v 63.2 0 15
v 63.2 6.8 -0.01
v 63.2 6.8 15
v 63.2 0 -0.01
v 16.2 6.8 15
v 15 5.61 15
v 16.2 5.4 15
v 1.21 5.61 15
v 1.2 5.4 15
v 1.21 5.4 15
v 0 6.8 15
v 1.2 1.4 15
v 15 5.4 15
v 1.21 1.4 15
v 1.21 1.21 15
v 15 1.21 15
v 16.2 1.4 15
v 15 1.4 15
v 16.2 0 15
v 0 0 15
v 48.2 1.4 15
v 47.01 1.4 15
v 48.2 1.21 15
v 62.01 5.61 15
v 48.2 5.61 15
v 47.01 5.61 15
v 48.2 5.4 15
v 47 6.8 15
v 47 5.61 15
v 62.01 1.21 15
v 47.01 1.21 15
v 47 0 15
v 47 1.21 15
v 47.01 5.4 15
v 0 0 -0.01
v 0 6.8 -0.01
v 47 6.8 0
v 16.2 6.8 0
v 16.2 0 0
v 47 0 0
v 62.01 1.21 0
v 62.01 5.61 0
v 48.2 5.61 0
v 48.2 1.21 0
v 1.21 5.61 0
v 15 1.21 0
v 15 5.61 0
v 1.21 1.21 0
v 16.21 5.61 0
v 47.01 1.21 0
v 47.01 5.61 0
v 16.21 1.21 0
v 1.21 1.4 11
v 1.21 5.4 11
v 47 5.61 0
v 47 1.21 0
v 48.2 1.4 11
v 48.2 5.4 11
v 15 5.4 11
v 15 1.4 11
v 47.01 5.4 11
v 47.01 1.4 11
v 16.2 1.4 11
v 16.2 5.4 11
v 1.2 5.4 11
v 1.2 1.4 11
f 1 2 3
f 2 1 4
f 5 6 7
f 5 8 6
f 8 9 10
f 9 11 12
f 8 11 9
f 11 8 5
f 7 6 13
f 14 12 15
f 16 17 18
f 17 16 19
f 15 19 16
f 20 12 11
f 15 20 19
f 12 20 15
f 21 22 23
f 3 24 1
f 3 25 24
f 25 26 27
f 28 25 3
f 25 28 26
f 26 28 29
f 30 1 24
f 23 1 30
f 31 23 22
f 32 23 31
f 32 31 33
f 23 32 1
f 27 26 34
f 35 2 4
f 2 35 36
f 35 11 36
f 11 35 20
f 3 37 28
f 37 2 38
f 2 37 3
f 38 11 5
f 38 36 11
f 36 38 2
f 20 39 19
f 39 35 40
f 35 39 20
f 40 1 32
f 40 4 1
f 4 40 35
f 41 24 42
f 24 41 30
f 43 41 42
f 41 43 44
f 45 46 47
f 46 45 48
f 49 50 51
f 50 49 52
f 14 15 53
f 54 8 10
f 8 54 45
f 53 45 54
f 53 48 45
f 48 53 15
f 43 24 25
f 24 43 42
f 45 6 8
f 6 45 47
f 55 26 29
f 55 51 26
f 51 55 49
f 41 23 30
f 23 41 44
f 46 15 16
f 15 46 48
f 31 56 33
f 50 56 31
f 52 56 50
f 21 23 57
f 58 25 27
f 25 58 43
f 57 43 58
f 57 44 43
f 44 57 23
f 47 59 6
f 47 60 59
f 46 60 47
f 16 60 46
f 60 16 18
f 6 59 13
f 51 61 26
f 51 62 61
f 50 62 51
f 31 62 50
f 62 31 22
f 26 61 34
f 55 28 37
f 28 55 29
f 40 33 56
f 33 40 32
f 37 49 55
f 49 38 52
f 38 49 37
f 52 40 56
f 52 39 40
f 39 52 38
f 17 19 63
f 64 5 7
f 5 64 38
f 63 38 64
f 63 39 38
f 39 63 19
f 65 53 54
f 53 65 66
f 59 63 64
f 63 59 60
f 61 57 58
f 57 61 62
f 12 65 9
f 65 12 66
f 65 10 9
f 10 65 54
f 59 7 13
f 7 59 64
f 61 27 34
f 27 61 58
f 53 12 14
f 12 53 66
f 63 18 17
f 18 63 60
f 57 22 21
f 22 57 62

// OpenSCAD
// file: ../Base/PlacementOptions.scad
// Fischertechnik Box Foundation
// Placement Options

// Alignment
NoAlign = 0;
AlignLeft = 1;
AlignBottom = 2;
AlignCenter = 3;
AlignRight = 4;
AlignTop = 5;

// Element rotation degree steps
rotations = [0, -90, -180, -270];

// Rotation
NoRotation = 0;
Rotate0 = 0;
Rotate90 = 1;
Rotate180 = 2;
Rotate270 = 3;

// Docking (seen from above)
NoDock = -1;
DockLeft = 0;
DockTop = 1;
DockRight = 2;
DockCorner = 2;
DockBottom = 3;

// Web corners
LowerLeft = 0;
UpperLeft = 1;
UpperRight = 2;
LowerRight = 3;

// Web position relative to corner
LeftOfCorner = 0;
RightOfCorner = 1;
// file: ../Base/Boxes.scad
// Fischertechnik Box Foundation
// Pre-designed Boxes

use <Constants.scad>

include <PlacementOptions.scad>

box190Width = 190;
box190Depth = 130;
box130Width = 130;
box130Depth = 95;

// Values are from an original ec3 box
topBottomDifference = 1.5;
outerHeight = 40;
baseThickness = 1.8;
innerHeight = outerHeight - baseThickness;
stackExcess = 5.7;
radius = 3.5;
wallThickness = 1.5;
tolerance = 0.2;

boxWallThickness = wallThickness;
boxBaseThickness = baseThickness;
boxWebWidth = 3.0;

// getBoxWallThickness()
// Gets the wall thickness of a Fischertechnik Box
function getBoxWallThickness() = boxWallThickness;

// getBoxUsageHeight(height = 38.2)
// Gets the usable height of a Fischertechnik box
// height = Outer height of the box from the bottom to the upper edge.
function getBoxUsageHeight(height = outerHeight) = height - baseThickness - stackExcess;

// getBoxInnerHeight()
// Gets the inner height of a Fischertechnik box, including the stack excess
function getBoxInnerHeight() = innerHeight;

// getBoxBaseThickness()
// Gets the thickness of the Fischertechnik box base.
function getBoxBaseThickness() = boxBaseThickness;

// getBoxWebWidth()
// Gets the width of a box web
function getBoxWebWidth() = boxWebWidth;

// getBox190Space()
// Gets the usable inner space of a Box 190 as an x/y-list
function getBox190Space() = [
    box190Width - 2*getBoxWallThickness() - topBottomDifference, 
    box190Depth - 2*getBoxWallThickness() - topBottomDifference ];

// RoundedCornerPlate(width, depth, height, radius)
// Creates a body plate with rounded corners for a box. Used
// also to create the complete box with the hull module.
// width = Width of the plate
// depth = depth of the plate 
// height = thickness of the plate
// radius = radius of the rounded corner
module RoundedCornerPlate(width, depth, height, radius) {
    translate([radius, radius])
    hull() {
        w = width-2*radius;
        d = depth-2*radius;
        cube([w, d, height]);
        cylinder(height, r=radius, $fn=getFragments());
        translate([w, 0])
            cylinder(height, r=radius, $fn=getFragments());
        translate([w, d])
            cylinder(height, r=radius, $fn=getFragments());
        translate([0, d])
            cylinder(height, r=radius, $fn=getFragments());
    }
}

// BoxBase(width, depth)
// Creates an empty stackable Fischertechnik compatible box
// width = Outer width of the box (190, 130, ...)
// depth = Outer depth of the box (130, 95, ...)

module BoxBase(width, depth, height=outerHeight) {    
    thinPlate = 0.01;

    innerHeight = height - baseThickness;    
    
    module Body(tolerance=tolerance) {
        hull() {
            // Bottom with tolerance to fit into the original boxes when stacked
            translate([-wallThickness+tolerance, -wallThickness+tolerance, -baseThickness])
                RoundedCornerPlate(width-topBottomDifference-2*tolerance, depth-topBottomDifference-2*tolerance, thinPlate, radius);
            
            // Top
            translate([-wallThickness-topBottomDifference/2, -wallThickness-topBottomDifference/2, innerHeight-thinPlate])
                RoundedCornerPlate(width, depth, thinPlate, radius);
         }
    }

    module Cutoff() {
        hull() {
            coWidth = width - 2*wallThickness;
            coDepth = depth - 2*wallThickness;
            
            // Bottom
            RoundedCornerPlate(coWidth-topBottomDifference, coDepth-topBottomDifference, thinPlate, radius);

            // Top
            translate([-topBottomDifference/2, -topBottomDifference/2, innerHeight+thinPlate]) 
                RoundedCornerPlate(coWidth, coDepth, thinPlate, radius);
        }
    }
    
    difference() {        
        Body();
        Cutoff();
        stackOffset = innerHeight - stackExcess;
        translate([0, 0, stackOffset + baseThickness])
            Body(tolerance=0);
    }
}

// Creates the Fischertechnik empty box 130x190 mm and places it at position 0,0
// 190x130 are the outer sizes, the inner space is slightly smaller. Use getBox190Space() to get the inner sizes.
// The box is positioned that the usable inner space is at the 0,0,0 position.

module Box190() {
    BoxBase(box190Width, box190Depth);
}

// Gets the usable inner space of a Box 130 as an x/y-list
function getBox130Space() = [
    box130Width - 2*getBoxWallThickness() - topBottomDifference, 
    box130Depth - 2*getBoxWallThickness() - topBottomDifference ];

// Creates the Fischertechnik empty box 95x130 mm and places it at position 0,0
// 190x130 are the outer sizes, the inner space is slightly smaller. Use getBox190Space() to get the inner sizes.
// The box is positioned that the usable inner space is at the 0,0,0 position.

module Box130() {
    BoxBase(box130Width, box130Depth);
}

// Creates a web at the specified box walls
// corner 0 = LowerLeft, 1 = UpperLeft, 2 = UpperRight, 3 = LowerRight
// side 0 = LeftOfCorner, 1 = RightOfCorner
// distance = Distance in mm from the corner
// boxSpace = inner width and depth of the box (default: Box 190)
// webWidth = length of the web (default is 3 mms)
// webThickness = thickness of the web (default is 1 mm)
// height = Height of the web (standard is getBoxUsageHeight())

module BoxWeb(corner, side, distance, boxSpace=getBox190Space(), webWidth=getBoxWebWidth(), webThickness=1.0, height=getBoxUsageHeight()) {
    sink = getBoxWallThickness()/2;

    width = (corner % 2 == 0) ? 
            (side == LeftOfCorner ? webWidth : webThickness) :
            (side == LeftOfCorner ? webThickness : webWidth);

    depth = (corner % 2 == 0) ? 
            (side == RightOfCorner ? webWidth : webThickness) :
            (side == RightOfCorner ? webThickness : webWidth);
    
    xDiff = corner == LowerLeft ? 
                (side == LeftOfCorner ? -sink : distance) :
            (corner == UpperLeft ?                
                (side == LeftOfCorner ? distance : -sink) :
            (corner == UpperRight ?
                (side == LeftOfCorner ? boxSpace.x-webWidth+sink : boxSpace.x-distance-webThickness) :
                (side == LeftOfCorner ? boxSpace.x-distance-webThickness: boxSpace.x-webWidth+sink)));

    yDiff = corner == LowerLeft ? 
                (side == RightOfCorner ? -sink : distance) :
            (corner == UpperLeft ?
                (side == RightOfCorner ? boxSpace.y-distance-webThickness : boxSpace.y-webWidth+sink) :
            (corner == UpperRight ?
                (side == RightOfCorner ? boxSpace.y-webWidth+sink : boxSpace.y-distance-webThickness) :
                (side == RightOfCorner ? distance : -sink)));
    
    translate([xDiff, yDiff, -getExcess()])
        cube([width, depth, height + 2*getExcess()]);
}
// file: ../Base/Rotation.scad
// Fischertechnik Box Foundation
// Geometry Helpers Rotation

include <PlacementOptions.scad>

// getRotatedSpace(space, rotation=NoRotation)
// Rotates the space dependent on the specified rotation

function getRotatedSpace(space, rotation=NoRotation) = [
    (rotation == Rotate90 || rotation == Rotate270) ? space.y : space.x,
    (rotation == Rotate90 || rotation == Rotate270) ? space.x : space.y
];

// Rotates the given space around the fixed left lower corner
// space = the space the children needs as width/depth list [width,depth]
// rotation = 0 Rotate0 degrees, 1 Rotate90 degrees, 2 Rotate180 degrees, 3 Rotate270 degrees (equivalent to -90)

module RotateFix(space, rotation=NoRotation) {
    dy = (rotation == Rotate0 || rotation == Rotate270) ? 0 :
        (rotation == Rotate90) ? space.x :
        space.y;
    dx = (rotation < Rotate180) ? 0 :
        (rotation == Rotate180) ? space.x :
        space.y;
    
    translate([dx, dy, 0])
        rotate([0, 0, rotations[rotation]])
            children();
}
// file: ../Base/Alignment.scad
// Fischertechnik Box Foundation
// Geometry Helpers Alignment

include <PlacementOptions.scad>

// getAlignedX(elementWidth, spaceWidth, align=AlignRight, offset=0)
// Gets the aligned X offset of an element with the given
// width in the given space.
// elementWidth = The width of the element to positon
// spaceWidth = The space where the element should be aligned
// align = 0 AlignLeft, 1 AlignCenter, 2 AlignRight
// offset = an optional offset from the aligned position. When
// aligned left or centered, then positive values are in X direction.
// When aligned right then positive values are in negative X direction.

function getAlignedX(elementWidth, spaceWidth, align=AlignRight, offset=0) =
    (align == AlignLeft) ?
        offset :
        ((align == AlignCenter) ?
        (spaceWidth - elementWidth)/2 + offset :
        spaceWidth - offset - elementWidth);

// getAlignedY(elementDepth, spaceDepth, align=AlignTop, offset=0)
// Gets the aligned Y offset of an element with the given
// depth in the given space.
// elementDepth = The depth of the element to positon
// spaceDepth = The space where the element should be aligned
// align = 0 AlignBottom, 1 AlignCenter, 2 AlignTop
// offset = an optional offset from the aligned position. When
// aligned bottom or centered, then positive values are in Y direction.
// When aligned top then positive values are in negative Y direction.

function getAlignedY(elementDepth, spaceDepth, align=AlignTop, offset=0) =
    (align == AlignBottom) ?
        offset :
        ((align == AlignCenter) ?
        (spaceDepth - elementDepth)/2 + offset :
        spaceDepth - offset - elementDepth);
// file: FrameAxis60.scad
// Fischertechnik Box Library
// Frame for single 60 mm Axis
// 31032

use <../ModelBase/Complex.scad>

length = 60;

// getFrameAxis60Space()
// Gets the width (.x) and depth (.y) of the axis frame.

function getFrameAxis60Space() = getFrameAxisSpace(length);

// FrameAxis60()
// Axis holder for a single 60 mm axis.

module FrameAxis60() {
    FrameAxis(length);
}

// Test
color("lightgray")
FrameAxis60();
// file: ../Base/Placement.scad
// Fischertechnik Box Foundation
// Geometry Helpers Placement

use <Constants.scad>
use <Alignment.scad>
use <Rotation.scad>
use <Boxes.scad>

include <PlacementOptions.scad>

// Place(x=0, y=0, elementSpace=[0,0], alignX=AlignLeft, alignY=AlignBottom, rotation=Rotate0, boxSpace=getBox190Space())
// Places the child at the specified position
// y = Y-Position. This is a relative position when an X aligment is specified.
// x = X-Position. This is a relative position when an Y aligment is specified.
// elementSpace = space of the element to be placed [x,y]
// alignX = -1=NoAlign, 0 AlignLeft, 1 AlignCenter, 3 AlignRight (elementSpace and boxSpace required!)
// alignY = -1=NoAlign, 2 AlignBottom, 1 AlignCenter, 4 AlignTop (elementSpace and boxSpace required!)
// rotation = 0 Rotate0 0 degrees, 1 Rotate90 90 degrees, 
// 2 Rotate180 180 degrees, 3 Rotate270 270 degrees (equivalent to -90)
// boxSpace = Inner space of the box where the placement occurs [x,y] - default is Box 190x130 inner space

module Place(x=0, y=0, elementSpace=[0,0], 
  alignX=AlignLeft, alignY=AlignBottom, 
  rotation=NoRotation, boxSpace=getBox190Space()) {

    module Position(x, y, space, rotation=Rotate0) {
        translate([x, y, 0])
            RotateFix(space, rotation)
                children();
    }

    space = getRotatedSpace(elementSpace, rotation);
    alignedX = getAlignedX(space.x, boxSpace.x, alignX, x);
    alignedY = getAlignedY(space.y, boxSpace.y, alignY, y);
    Position(alignedX, alignedY, elementSpace, rotation)
        children();
}

// Center(space=getBox130Space(), elementSpace=[0,0])
// space = Space where the children is centered. For cylinder use centered=true and no elementSpace.
// elementSpace = space of the element to be centered [x,y]

module Center(space=getBox190Space(), elementSpace=[0,0]) {
    Place(elementSpace=elementSpace, boxSpace=space, alignX=AlignCenter, alignY=AlignCenter)
        children();
}

// CenterHorizontal(width=0, y=0, offset=0, space=getBox130Space())
// width = Width of the element to be placed.
// y = Y position of the element
// offset = Offset from the center position (negative will be left of the center)
// space = Space where the element is placed

module CenterHorizontal(width=0, y=0, offset=0, space=getBox190Space()) {
    Place(x=offset, y=y, elementSpace=[width, 0], boxSpace=space, alignX=AlignCenter)
        children(0);
}

// CenterVertical(depth=0, x=0, offset=0, space=getBox130Space())
// depth = Depth of the element to be placed.
// x = X position of the element
// offset = Offset from the center position (negative will be down of the center)
// space = Space where the element is placed

module CenterVertical(depth=0, x=0, offset=0, space=getBox190Space()) {
    Place(x=x, y=offset, elementSpace=[0, depth], boxSpace=space, alignY=AlignCenter)
        children(0);
}

// getIsVertical(align)
// True if the specified alignment needs a vertical orientation for a divider (AlignRight, AlignLeft)

function getIsVertical(align) = (align == AlignRight || align == AlignLeft);

// getIsHorizontal(align)
// True if the specified alignment needs a horizontal orientation for a divider (AlignTop, AlignBottom)

function getIsHorizontal(align) = (align == AlignTop || align == AlignBottom);
// file: ../Base/Constants.scad
// Fischertechnik Box Foundation
// Constants

// Constant values necessary for multiple elements

// Base constants
dividerThickness = 1.2;
excess = 0.01;
fragments = 90;
tolerance = 0.8;

// Gets the thickness of a divider 
function getDividerThickness() = dividerThickness;

// Gets the excess that is used to merge walls into each other
function getExcess() = excess;

// Gets amount of fragments of a cylinder
function getFragments() = fragments;

// Gets the inner tolerance of a frame to each side
function getTolerance() = tolerance;


// Fischertechnik specific constants
axisDiameter = 4;
axisBottomDiameter = axisDiameter + 1;
axisTolerance = 0.2;

// Gets axis diameter of Fischertechnik axis
function getAxisDiameter() = axisDiameter;

// Gets axis diameter tolerance (subtracted for element axis)
function getAxisTolerance() = axisTolerance;

// Gets the axis diameter for standing axis
function getStandAxisDiameter() = getAxisDiameter() - getAxisTolerance();

// Gets axis bottom diameter for thicker part at the bottom
function getAxisBottomDiameter() = axisBottomDiameter;

standardEdgeDistance = 2.5;
standardWebDistance = 11.5;
standardCornerLength = 15;

// gets the standard distance to the wall of the box for dockable frames with webs
function getStandardEdgeDistance() = standardEdgeDistance;

// gets the standard distance of each web to the corner of the dockable frame
function getStandardWebDistance() = standardWebDistance;

// gets the standard length of the corner walls of a dockable frame
function getStandardCornerLength() = standardCornerLength;

tubeWallFactor = 0.8;

// gets the wall thickness of a tube.
function getTubeWallThickness() = tubeWallFactor * getDividerThickness();

smallPartsFrameHeight = 20;

// gets the frame height for docked small parts boxes.
function getSmallPartsFrameHeight() = smallPartsFrameHeight;

hubRingDiameter = 19.5;
hubRingLevelDiameter = 21;

// gets the diameter of a tube matching the inner ring of a wheel
function getHubRingDiameter() = hubRingDiameter;

// gets the diameter of a hub tube with a thicker diameter
function getHubRingLevelDiameter() = hubRingLevelDiameter;
// main file
// Fischertechnik Box Library
// Frame for single 60 mm connecting rod
// 37283

use <../Base/Constants.scad>
use <../Base/Placement.scad>
use <../ModelBase/Complex.scad>
use <FrameAxis60.scad>

/* [Hidden] */
length = 60;
bearingLength = 15;

// getFrameConnectingRod60Space()
// Gets the width (.x) and depth (.y) of the axis frame.

function getFrameConnectingRod30Space() = getFrameAxis60Space();

// FrameConnectingRod60()
// Axis holder for a single 60 mm connecting rod.

module FrameConnectingRod60() {
    ElevatedFramesWithCutoff([length, getAxisDiameter(), getAxisDiameter()], getFrameAxisDepth(), getFrameAxisHeight(), bearingLength);
}

// Test
color("lightgray")
FrameConnectingRod60();
